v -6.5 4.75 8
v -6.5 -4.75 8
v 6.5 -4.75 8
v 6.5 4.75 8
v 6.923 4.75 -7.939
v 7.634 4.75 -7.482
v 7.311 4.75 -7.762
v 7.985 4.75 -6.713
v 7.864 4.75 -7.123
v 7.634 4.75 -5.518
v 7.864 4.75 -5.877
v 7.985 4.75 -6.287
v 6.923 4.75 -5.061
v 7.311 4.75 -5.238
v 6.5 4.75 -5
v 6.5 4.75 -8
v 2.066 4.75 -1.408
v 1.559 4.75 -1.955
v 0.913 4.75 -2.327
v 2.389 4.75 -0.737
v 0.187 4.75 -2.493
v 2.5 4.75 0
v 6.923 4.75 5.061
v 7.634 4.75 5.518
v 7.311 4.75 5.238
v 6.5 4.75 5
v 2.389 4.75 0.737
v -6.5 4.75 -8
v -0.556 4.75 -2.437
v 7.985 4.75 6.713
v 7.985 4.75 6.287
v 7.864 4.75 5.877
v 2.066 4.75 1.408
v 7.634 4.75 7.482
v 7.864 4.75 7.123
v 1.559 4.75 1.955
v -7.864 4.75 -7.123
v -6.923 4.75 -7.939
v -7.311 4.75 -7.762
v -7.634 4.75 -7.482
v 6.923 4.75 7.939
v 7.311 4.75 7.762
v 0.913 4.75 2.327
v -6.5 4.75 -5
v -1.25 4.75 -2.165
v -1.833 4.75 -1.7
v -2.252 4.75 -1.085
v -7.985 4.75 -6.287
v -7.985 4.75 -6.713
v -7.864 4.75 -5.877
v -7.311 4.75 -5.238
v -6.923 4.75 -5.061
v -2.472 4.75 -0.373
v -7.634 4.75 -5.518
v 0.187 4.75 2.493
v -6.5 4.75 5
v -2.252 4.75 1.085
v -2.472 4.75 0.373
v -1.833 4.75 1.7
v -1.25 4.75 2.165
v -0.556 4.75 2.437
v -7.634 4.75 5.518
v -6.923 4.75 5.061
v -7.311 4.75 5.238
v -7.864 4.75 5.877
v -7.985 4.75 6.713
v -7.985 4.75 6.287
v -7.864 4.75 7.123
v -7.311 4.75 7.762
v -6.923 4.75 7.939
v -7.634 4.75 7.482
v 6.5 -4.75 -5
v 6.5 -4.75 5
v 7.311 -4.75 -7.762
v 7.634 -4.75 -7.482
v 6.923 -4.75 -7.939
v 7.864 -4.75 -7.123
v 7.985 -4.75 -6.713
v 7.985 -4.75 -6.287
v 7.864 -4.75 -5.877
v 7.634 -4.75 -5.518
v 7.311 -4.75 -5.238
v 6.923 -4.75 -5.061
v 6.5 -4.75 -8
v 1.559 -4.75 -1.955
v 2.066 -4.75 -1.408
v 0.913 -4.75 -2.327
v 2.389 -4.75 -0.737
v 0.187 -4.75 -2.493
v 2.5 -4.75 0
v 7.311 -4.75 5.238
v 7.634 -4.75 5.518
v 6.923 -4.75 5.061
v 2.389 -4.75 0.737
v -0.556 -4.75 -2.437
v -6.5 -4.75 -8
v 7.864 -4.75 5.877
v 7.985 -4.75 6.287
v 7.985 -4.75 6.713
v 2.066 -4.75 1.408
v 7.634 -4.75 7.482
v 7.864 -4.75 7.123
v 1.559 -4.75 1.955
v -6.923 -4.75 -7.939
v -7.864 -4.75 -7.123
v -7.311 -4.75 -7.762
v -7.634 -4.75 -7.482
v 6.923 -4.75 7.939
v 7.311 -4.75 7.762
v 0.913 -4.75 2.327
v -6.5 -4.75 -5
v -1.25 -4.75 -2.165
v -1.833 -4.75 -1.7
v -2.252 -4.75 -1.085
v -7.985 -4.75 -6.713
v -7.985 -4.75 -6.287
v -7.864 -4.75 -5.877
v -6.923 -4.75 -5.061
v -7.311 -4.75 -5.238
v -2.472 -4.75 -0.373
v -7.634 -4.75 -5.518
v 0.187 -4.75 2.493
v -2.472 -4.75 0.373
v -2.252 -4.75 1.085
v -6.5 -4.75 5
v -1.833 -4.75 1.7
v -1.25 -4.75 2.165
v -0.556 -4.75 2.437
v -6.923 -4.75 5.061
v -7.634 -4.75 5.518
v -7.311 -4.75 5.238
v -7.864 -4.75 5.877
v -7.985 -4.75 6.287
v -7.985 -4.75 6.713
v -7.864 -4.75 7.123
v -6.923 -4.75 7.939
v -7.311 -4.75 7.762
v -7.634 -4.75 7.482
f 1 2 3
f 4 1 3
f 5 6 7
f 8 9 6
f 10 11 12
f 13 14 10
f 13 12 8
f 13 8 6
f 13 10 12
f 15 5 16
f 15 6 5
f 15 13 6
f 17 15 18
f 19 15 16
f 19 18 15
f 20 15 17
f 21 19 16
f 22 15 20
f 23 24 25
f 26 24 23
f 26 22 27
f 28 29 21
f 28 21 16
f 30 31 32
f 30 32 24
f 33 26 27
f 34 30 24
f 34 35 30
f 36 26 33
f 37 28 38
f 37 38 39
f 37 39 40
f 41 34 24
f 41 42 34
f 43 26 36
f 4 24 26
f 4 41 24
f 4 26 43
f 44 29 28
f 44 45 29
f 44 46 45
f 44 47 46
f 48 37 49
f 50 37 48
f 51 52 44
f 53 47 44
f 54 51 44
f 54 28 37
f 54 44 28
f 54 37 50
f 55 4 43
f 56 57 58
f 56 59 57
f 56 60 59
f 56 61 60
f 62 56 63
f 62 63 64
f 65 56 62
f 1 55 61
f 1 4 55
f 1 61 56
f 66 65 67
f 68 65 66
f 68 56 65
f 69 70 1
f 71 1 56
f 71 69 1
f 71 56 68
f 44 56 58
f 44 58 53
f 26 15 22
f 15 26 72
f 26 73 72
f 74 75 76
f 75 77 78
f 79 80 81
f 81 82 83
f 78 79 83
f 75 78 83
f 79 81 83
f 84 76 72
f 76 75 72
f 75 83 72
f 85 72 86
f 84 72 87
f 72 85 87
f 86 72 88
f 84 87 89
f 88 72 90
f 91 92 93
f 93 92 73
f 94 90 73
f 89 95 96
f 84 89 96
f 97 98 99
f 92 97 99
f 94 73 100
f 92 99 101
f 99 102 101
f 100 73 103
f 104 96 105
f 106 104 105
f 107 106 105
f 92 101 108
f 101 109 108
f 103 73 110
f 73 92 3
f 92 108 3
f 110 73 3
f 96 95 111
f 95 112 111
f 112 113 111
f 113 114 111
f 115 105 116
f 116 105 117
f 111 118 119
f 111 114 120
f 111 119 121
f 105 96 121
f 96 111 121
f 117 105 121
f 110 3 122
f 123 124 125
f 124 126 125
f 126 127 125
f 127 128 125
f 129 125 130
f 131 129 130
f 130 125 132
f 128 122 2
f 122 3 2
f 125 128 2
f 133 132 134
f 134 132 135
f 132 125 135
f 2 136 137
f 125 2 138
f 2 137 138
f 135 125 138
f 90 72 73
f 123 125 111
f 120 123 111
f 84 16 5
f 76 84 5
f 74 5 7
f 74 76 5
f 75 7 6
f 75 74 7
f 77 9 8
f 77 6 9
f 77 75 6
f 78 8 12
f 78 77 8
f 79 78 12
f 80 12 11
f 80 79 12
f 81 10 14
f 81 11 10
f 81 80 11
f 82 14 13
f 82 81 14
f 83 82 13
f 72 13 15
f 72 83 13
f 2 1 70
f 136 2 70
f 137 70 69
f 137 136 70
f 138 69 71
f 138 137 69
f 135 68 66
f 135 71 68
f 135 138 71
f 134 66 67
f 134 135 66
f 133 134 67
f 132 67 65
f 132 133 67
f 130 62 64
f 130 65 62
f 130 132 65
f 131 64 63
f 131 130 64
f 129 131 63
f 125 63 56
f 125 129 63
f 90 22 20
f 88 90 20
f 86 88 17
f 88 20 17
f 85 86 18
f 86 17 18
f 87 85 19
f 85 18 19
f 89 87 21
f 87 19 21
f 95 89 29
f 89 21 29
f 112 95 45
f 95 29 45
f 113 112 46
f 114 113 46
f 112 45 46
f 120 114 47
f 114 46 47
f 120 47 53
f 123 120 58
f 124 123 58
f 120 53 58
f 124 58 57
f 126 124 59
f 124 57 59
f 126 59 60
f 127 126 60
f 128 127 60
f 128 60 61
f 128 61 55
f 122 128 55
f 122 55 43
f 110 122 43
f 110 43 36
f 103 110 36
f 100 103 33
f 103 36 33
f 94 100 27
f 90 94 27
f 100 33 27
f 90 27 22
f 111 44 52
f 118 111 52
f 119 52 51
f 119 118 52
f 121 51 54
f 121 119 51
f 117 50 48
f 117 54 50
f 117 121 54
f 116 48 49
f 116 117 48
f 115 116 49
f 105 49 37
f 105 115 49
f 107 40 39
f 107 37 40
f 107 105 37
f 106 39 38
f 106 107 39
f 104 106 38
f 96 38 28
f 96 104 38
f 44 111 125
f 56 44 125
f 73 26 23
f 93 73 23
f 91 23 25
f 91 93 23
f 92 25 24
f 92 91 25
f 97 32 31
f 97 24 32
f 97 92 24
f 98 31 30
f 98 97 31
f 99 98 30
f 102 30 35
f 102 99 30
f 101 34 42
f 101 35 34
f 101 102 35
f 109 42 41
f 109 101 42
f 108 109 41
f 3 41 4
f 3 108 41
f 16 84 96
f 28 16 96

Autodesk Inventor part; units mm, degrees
ref_plane "YZ Plane" through (0, 0, 0) normal (1, 0, 0) x (0, 1, 0)
ref_plane "XZ Plane" through (0, 0, 0) normal (0, 1, 0) x (-1, 0, 0)
ref_plane "XY Plane" through (0, 0, 0) normal (0, 0, 1) x (1, 0, 0)
sketch "Sketch1" plane through (0, 0, 0) normal (0, 1, 0) x (-1, 0, 0)
  line L0 (6.5, 8) -> (-6.5, 8)
  line L1 (-6.5, 5) -> (-6.5, -5)
  line L2 (-6.5, -8) -> (6.5, -8)
  line L3 (6.5, -5) -> (6.5, 5)
  line L4 (6.5, 8) -> (-6.5, -8) construction
  line L5 (-6.5, 8) -> (6.5, -8) construction
  arc A0 (6.5, 5) -> (6.5, 8) centre (6.5, 6.5) ccw
  arc A1 (6.5, -8) -> (6.5, -5) centre (6.5, -6.5) ccw
  arc A2 (-6.5, -5) -> (-6.5, -8) centre (-6.5, -6.5) ccw
  arc A3 (-6.5, 8) -> (-6.5, 5) centre (-6.5, 6.5) ccw
  point P0 (0, 0)
  dimension "d1" = 16
extrude "Extrusion1" add sketch "Sketch1" along normal mid plane 9.5
sketch "Sketch2" plane through (0, 4.75, 0) normal (0, 1, 0) x (1, 0, 0)
  circle A0 centre (0, 0) radius 2.5
  dimension "d6" = 5
extrude "Extrusion2" cut sketch "Sketch2" against normal through all
properties part number "Varia"
